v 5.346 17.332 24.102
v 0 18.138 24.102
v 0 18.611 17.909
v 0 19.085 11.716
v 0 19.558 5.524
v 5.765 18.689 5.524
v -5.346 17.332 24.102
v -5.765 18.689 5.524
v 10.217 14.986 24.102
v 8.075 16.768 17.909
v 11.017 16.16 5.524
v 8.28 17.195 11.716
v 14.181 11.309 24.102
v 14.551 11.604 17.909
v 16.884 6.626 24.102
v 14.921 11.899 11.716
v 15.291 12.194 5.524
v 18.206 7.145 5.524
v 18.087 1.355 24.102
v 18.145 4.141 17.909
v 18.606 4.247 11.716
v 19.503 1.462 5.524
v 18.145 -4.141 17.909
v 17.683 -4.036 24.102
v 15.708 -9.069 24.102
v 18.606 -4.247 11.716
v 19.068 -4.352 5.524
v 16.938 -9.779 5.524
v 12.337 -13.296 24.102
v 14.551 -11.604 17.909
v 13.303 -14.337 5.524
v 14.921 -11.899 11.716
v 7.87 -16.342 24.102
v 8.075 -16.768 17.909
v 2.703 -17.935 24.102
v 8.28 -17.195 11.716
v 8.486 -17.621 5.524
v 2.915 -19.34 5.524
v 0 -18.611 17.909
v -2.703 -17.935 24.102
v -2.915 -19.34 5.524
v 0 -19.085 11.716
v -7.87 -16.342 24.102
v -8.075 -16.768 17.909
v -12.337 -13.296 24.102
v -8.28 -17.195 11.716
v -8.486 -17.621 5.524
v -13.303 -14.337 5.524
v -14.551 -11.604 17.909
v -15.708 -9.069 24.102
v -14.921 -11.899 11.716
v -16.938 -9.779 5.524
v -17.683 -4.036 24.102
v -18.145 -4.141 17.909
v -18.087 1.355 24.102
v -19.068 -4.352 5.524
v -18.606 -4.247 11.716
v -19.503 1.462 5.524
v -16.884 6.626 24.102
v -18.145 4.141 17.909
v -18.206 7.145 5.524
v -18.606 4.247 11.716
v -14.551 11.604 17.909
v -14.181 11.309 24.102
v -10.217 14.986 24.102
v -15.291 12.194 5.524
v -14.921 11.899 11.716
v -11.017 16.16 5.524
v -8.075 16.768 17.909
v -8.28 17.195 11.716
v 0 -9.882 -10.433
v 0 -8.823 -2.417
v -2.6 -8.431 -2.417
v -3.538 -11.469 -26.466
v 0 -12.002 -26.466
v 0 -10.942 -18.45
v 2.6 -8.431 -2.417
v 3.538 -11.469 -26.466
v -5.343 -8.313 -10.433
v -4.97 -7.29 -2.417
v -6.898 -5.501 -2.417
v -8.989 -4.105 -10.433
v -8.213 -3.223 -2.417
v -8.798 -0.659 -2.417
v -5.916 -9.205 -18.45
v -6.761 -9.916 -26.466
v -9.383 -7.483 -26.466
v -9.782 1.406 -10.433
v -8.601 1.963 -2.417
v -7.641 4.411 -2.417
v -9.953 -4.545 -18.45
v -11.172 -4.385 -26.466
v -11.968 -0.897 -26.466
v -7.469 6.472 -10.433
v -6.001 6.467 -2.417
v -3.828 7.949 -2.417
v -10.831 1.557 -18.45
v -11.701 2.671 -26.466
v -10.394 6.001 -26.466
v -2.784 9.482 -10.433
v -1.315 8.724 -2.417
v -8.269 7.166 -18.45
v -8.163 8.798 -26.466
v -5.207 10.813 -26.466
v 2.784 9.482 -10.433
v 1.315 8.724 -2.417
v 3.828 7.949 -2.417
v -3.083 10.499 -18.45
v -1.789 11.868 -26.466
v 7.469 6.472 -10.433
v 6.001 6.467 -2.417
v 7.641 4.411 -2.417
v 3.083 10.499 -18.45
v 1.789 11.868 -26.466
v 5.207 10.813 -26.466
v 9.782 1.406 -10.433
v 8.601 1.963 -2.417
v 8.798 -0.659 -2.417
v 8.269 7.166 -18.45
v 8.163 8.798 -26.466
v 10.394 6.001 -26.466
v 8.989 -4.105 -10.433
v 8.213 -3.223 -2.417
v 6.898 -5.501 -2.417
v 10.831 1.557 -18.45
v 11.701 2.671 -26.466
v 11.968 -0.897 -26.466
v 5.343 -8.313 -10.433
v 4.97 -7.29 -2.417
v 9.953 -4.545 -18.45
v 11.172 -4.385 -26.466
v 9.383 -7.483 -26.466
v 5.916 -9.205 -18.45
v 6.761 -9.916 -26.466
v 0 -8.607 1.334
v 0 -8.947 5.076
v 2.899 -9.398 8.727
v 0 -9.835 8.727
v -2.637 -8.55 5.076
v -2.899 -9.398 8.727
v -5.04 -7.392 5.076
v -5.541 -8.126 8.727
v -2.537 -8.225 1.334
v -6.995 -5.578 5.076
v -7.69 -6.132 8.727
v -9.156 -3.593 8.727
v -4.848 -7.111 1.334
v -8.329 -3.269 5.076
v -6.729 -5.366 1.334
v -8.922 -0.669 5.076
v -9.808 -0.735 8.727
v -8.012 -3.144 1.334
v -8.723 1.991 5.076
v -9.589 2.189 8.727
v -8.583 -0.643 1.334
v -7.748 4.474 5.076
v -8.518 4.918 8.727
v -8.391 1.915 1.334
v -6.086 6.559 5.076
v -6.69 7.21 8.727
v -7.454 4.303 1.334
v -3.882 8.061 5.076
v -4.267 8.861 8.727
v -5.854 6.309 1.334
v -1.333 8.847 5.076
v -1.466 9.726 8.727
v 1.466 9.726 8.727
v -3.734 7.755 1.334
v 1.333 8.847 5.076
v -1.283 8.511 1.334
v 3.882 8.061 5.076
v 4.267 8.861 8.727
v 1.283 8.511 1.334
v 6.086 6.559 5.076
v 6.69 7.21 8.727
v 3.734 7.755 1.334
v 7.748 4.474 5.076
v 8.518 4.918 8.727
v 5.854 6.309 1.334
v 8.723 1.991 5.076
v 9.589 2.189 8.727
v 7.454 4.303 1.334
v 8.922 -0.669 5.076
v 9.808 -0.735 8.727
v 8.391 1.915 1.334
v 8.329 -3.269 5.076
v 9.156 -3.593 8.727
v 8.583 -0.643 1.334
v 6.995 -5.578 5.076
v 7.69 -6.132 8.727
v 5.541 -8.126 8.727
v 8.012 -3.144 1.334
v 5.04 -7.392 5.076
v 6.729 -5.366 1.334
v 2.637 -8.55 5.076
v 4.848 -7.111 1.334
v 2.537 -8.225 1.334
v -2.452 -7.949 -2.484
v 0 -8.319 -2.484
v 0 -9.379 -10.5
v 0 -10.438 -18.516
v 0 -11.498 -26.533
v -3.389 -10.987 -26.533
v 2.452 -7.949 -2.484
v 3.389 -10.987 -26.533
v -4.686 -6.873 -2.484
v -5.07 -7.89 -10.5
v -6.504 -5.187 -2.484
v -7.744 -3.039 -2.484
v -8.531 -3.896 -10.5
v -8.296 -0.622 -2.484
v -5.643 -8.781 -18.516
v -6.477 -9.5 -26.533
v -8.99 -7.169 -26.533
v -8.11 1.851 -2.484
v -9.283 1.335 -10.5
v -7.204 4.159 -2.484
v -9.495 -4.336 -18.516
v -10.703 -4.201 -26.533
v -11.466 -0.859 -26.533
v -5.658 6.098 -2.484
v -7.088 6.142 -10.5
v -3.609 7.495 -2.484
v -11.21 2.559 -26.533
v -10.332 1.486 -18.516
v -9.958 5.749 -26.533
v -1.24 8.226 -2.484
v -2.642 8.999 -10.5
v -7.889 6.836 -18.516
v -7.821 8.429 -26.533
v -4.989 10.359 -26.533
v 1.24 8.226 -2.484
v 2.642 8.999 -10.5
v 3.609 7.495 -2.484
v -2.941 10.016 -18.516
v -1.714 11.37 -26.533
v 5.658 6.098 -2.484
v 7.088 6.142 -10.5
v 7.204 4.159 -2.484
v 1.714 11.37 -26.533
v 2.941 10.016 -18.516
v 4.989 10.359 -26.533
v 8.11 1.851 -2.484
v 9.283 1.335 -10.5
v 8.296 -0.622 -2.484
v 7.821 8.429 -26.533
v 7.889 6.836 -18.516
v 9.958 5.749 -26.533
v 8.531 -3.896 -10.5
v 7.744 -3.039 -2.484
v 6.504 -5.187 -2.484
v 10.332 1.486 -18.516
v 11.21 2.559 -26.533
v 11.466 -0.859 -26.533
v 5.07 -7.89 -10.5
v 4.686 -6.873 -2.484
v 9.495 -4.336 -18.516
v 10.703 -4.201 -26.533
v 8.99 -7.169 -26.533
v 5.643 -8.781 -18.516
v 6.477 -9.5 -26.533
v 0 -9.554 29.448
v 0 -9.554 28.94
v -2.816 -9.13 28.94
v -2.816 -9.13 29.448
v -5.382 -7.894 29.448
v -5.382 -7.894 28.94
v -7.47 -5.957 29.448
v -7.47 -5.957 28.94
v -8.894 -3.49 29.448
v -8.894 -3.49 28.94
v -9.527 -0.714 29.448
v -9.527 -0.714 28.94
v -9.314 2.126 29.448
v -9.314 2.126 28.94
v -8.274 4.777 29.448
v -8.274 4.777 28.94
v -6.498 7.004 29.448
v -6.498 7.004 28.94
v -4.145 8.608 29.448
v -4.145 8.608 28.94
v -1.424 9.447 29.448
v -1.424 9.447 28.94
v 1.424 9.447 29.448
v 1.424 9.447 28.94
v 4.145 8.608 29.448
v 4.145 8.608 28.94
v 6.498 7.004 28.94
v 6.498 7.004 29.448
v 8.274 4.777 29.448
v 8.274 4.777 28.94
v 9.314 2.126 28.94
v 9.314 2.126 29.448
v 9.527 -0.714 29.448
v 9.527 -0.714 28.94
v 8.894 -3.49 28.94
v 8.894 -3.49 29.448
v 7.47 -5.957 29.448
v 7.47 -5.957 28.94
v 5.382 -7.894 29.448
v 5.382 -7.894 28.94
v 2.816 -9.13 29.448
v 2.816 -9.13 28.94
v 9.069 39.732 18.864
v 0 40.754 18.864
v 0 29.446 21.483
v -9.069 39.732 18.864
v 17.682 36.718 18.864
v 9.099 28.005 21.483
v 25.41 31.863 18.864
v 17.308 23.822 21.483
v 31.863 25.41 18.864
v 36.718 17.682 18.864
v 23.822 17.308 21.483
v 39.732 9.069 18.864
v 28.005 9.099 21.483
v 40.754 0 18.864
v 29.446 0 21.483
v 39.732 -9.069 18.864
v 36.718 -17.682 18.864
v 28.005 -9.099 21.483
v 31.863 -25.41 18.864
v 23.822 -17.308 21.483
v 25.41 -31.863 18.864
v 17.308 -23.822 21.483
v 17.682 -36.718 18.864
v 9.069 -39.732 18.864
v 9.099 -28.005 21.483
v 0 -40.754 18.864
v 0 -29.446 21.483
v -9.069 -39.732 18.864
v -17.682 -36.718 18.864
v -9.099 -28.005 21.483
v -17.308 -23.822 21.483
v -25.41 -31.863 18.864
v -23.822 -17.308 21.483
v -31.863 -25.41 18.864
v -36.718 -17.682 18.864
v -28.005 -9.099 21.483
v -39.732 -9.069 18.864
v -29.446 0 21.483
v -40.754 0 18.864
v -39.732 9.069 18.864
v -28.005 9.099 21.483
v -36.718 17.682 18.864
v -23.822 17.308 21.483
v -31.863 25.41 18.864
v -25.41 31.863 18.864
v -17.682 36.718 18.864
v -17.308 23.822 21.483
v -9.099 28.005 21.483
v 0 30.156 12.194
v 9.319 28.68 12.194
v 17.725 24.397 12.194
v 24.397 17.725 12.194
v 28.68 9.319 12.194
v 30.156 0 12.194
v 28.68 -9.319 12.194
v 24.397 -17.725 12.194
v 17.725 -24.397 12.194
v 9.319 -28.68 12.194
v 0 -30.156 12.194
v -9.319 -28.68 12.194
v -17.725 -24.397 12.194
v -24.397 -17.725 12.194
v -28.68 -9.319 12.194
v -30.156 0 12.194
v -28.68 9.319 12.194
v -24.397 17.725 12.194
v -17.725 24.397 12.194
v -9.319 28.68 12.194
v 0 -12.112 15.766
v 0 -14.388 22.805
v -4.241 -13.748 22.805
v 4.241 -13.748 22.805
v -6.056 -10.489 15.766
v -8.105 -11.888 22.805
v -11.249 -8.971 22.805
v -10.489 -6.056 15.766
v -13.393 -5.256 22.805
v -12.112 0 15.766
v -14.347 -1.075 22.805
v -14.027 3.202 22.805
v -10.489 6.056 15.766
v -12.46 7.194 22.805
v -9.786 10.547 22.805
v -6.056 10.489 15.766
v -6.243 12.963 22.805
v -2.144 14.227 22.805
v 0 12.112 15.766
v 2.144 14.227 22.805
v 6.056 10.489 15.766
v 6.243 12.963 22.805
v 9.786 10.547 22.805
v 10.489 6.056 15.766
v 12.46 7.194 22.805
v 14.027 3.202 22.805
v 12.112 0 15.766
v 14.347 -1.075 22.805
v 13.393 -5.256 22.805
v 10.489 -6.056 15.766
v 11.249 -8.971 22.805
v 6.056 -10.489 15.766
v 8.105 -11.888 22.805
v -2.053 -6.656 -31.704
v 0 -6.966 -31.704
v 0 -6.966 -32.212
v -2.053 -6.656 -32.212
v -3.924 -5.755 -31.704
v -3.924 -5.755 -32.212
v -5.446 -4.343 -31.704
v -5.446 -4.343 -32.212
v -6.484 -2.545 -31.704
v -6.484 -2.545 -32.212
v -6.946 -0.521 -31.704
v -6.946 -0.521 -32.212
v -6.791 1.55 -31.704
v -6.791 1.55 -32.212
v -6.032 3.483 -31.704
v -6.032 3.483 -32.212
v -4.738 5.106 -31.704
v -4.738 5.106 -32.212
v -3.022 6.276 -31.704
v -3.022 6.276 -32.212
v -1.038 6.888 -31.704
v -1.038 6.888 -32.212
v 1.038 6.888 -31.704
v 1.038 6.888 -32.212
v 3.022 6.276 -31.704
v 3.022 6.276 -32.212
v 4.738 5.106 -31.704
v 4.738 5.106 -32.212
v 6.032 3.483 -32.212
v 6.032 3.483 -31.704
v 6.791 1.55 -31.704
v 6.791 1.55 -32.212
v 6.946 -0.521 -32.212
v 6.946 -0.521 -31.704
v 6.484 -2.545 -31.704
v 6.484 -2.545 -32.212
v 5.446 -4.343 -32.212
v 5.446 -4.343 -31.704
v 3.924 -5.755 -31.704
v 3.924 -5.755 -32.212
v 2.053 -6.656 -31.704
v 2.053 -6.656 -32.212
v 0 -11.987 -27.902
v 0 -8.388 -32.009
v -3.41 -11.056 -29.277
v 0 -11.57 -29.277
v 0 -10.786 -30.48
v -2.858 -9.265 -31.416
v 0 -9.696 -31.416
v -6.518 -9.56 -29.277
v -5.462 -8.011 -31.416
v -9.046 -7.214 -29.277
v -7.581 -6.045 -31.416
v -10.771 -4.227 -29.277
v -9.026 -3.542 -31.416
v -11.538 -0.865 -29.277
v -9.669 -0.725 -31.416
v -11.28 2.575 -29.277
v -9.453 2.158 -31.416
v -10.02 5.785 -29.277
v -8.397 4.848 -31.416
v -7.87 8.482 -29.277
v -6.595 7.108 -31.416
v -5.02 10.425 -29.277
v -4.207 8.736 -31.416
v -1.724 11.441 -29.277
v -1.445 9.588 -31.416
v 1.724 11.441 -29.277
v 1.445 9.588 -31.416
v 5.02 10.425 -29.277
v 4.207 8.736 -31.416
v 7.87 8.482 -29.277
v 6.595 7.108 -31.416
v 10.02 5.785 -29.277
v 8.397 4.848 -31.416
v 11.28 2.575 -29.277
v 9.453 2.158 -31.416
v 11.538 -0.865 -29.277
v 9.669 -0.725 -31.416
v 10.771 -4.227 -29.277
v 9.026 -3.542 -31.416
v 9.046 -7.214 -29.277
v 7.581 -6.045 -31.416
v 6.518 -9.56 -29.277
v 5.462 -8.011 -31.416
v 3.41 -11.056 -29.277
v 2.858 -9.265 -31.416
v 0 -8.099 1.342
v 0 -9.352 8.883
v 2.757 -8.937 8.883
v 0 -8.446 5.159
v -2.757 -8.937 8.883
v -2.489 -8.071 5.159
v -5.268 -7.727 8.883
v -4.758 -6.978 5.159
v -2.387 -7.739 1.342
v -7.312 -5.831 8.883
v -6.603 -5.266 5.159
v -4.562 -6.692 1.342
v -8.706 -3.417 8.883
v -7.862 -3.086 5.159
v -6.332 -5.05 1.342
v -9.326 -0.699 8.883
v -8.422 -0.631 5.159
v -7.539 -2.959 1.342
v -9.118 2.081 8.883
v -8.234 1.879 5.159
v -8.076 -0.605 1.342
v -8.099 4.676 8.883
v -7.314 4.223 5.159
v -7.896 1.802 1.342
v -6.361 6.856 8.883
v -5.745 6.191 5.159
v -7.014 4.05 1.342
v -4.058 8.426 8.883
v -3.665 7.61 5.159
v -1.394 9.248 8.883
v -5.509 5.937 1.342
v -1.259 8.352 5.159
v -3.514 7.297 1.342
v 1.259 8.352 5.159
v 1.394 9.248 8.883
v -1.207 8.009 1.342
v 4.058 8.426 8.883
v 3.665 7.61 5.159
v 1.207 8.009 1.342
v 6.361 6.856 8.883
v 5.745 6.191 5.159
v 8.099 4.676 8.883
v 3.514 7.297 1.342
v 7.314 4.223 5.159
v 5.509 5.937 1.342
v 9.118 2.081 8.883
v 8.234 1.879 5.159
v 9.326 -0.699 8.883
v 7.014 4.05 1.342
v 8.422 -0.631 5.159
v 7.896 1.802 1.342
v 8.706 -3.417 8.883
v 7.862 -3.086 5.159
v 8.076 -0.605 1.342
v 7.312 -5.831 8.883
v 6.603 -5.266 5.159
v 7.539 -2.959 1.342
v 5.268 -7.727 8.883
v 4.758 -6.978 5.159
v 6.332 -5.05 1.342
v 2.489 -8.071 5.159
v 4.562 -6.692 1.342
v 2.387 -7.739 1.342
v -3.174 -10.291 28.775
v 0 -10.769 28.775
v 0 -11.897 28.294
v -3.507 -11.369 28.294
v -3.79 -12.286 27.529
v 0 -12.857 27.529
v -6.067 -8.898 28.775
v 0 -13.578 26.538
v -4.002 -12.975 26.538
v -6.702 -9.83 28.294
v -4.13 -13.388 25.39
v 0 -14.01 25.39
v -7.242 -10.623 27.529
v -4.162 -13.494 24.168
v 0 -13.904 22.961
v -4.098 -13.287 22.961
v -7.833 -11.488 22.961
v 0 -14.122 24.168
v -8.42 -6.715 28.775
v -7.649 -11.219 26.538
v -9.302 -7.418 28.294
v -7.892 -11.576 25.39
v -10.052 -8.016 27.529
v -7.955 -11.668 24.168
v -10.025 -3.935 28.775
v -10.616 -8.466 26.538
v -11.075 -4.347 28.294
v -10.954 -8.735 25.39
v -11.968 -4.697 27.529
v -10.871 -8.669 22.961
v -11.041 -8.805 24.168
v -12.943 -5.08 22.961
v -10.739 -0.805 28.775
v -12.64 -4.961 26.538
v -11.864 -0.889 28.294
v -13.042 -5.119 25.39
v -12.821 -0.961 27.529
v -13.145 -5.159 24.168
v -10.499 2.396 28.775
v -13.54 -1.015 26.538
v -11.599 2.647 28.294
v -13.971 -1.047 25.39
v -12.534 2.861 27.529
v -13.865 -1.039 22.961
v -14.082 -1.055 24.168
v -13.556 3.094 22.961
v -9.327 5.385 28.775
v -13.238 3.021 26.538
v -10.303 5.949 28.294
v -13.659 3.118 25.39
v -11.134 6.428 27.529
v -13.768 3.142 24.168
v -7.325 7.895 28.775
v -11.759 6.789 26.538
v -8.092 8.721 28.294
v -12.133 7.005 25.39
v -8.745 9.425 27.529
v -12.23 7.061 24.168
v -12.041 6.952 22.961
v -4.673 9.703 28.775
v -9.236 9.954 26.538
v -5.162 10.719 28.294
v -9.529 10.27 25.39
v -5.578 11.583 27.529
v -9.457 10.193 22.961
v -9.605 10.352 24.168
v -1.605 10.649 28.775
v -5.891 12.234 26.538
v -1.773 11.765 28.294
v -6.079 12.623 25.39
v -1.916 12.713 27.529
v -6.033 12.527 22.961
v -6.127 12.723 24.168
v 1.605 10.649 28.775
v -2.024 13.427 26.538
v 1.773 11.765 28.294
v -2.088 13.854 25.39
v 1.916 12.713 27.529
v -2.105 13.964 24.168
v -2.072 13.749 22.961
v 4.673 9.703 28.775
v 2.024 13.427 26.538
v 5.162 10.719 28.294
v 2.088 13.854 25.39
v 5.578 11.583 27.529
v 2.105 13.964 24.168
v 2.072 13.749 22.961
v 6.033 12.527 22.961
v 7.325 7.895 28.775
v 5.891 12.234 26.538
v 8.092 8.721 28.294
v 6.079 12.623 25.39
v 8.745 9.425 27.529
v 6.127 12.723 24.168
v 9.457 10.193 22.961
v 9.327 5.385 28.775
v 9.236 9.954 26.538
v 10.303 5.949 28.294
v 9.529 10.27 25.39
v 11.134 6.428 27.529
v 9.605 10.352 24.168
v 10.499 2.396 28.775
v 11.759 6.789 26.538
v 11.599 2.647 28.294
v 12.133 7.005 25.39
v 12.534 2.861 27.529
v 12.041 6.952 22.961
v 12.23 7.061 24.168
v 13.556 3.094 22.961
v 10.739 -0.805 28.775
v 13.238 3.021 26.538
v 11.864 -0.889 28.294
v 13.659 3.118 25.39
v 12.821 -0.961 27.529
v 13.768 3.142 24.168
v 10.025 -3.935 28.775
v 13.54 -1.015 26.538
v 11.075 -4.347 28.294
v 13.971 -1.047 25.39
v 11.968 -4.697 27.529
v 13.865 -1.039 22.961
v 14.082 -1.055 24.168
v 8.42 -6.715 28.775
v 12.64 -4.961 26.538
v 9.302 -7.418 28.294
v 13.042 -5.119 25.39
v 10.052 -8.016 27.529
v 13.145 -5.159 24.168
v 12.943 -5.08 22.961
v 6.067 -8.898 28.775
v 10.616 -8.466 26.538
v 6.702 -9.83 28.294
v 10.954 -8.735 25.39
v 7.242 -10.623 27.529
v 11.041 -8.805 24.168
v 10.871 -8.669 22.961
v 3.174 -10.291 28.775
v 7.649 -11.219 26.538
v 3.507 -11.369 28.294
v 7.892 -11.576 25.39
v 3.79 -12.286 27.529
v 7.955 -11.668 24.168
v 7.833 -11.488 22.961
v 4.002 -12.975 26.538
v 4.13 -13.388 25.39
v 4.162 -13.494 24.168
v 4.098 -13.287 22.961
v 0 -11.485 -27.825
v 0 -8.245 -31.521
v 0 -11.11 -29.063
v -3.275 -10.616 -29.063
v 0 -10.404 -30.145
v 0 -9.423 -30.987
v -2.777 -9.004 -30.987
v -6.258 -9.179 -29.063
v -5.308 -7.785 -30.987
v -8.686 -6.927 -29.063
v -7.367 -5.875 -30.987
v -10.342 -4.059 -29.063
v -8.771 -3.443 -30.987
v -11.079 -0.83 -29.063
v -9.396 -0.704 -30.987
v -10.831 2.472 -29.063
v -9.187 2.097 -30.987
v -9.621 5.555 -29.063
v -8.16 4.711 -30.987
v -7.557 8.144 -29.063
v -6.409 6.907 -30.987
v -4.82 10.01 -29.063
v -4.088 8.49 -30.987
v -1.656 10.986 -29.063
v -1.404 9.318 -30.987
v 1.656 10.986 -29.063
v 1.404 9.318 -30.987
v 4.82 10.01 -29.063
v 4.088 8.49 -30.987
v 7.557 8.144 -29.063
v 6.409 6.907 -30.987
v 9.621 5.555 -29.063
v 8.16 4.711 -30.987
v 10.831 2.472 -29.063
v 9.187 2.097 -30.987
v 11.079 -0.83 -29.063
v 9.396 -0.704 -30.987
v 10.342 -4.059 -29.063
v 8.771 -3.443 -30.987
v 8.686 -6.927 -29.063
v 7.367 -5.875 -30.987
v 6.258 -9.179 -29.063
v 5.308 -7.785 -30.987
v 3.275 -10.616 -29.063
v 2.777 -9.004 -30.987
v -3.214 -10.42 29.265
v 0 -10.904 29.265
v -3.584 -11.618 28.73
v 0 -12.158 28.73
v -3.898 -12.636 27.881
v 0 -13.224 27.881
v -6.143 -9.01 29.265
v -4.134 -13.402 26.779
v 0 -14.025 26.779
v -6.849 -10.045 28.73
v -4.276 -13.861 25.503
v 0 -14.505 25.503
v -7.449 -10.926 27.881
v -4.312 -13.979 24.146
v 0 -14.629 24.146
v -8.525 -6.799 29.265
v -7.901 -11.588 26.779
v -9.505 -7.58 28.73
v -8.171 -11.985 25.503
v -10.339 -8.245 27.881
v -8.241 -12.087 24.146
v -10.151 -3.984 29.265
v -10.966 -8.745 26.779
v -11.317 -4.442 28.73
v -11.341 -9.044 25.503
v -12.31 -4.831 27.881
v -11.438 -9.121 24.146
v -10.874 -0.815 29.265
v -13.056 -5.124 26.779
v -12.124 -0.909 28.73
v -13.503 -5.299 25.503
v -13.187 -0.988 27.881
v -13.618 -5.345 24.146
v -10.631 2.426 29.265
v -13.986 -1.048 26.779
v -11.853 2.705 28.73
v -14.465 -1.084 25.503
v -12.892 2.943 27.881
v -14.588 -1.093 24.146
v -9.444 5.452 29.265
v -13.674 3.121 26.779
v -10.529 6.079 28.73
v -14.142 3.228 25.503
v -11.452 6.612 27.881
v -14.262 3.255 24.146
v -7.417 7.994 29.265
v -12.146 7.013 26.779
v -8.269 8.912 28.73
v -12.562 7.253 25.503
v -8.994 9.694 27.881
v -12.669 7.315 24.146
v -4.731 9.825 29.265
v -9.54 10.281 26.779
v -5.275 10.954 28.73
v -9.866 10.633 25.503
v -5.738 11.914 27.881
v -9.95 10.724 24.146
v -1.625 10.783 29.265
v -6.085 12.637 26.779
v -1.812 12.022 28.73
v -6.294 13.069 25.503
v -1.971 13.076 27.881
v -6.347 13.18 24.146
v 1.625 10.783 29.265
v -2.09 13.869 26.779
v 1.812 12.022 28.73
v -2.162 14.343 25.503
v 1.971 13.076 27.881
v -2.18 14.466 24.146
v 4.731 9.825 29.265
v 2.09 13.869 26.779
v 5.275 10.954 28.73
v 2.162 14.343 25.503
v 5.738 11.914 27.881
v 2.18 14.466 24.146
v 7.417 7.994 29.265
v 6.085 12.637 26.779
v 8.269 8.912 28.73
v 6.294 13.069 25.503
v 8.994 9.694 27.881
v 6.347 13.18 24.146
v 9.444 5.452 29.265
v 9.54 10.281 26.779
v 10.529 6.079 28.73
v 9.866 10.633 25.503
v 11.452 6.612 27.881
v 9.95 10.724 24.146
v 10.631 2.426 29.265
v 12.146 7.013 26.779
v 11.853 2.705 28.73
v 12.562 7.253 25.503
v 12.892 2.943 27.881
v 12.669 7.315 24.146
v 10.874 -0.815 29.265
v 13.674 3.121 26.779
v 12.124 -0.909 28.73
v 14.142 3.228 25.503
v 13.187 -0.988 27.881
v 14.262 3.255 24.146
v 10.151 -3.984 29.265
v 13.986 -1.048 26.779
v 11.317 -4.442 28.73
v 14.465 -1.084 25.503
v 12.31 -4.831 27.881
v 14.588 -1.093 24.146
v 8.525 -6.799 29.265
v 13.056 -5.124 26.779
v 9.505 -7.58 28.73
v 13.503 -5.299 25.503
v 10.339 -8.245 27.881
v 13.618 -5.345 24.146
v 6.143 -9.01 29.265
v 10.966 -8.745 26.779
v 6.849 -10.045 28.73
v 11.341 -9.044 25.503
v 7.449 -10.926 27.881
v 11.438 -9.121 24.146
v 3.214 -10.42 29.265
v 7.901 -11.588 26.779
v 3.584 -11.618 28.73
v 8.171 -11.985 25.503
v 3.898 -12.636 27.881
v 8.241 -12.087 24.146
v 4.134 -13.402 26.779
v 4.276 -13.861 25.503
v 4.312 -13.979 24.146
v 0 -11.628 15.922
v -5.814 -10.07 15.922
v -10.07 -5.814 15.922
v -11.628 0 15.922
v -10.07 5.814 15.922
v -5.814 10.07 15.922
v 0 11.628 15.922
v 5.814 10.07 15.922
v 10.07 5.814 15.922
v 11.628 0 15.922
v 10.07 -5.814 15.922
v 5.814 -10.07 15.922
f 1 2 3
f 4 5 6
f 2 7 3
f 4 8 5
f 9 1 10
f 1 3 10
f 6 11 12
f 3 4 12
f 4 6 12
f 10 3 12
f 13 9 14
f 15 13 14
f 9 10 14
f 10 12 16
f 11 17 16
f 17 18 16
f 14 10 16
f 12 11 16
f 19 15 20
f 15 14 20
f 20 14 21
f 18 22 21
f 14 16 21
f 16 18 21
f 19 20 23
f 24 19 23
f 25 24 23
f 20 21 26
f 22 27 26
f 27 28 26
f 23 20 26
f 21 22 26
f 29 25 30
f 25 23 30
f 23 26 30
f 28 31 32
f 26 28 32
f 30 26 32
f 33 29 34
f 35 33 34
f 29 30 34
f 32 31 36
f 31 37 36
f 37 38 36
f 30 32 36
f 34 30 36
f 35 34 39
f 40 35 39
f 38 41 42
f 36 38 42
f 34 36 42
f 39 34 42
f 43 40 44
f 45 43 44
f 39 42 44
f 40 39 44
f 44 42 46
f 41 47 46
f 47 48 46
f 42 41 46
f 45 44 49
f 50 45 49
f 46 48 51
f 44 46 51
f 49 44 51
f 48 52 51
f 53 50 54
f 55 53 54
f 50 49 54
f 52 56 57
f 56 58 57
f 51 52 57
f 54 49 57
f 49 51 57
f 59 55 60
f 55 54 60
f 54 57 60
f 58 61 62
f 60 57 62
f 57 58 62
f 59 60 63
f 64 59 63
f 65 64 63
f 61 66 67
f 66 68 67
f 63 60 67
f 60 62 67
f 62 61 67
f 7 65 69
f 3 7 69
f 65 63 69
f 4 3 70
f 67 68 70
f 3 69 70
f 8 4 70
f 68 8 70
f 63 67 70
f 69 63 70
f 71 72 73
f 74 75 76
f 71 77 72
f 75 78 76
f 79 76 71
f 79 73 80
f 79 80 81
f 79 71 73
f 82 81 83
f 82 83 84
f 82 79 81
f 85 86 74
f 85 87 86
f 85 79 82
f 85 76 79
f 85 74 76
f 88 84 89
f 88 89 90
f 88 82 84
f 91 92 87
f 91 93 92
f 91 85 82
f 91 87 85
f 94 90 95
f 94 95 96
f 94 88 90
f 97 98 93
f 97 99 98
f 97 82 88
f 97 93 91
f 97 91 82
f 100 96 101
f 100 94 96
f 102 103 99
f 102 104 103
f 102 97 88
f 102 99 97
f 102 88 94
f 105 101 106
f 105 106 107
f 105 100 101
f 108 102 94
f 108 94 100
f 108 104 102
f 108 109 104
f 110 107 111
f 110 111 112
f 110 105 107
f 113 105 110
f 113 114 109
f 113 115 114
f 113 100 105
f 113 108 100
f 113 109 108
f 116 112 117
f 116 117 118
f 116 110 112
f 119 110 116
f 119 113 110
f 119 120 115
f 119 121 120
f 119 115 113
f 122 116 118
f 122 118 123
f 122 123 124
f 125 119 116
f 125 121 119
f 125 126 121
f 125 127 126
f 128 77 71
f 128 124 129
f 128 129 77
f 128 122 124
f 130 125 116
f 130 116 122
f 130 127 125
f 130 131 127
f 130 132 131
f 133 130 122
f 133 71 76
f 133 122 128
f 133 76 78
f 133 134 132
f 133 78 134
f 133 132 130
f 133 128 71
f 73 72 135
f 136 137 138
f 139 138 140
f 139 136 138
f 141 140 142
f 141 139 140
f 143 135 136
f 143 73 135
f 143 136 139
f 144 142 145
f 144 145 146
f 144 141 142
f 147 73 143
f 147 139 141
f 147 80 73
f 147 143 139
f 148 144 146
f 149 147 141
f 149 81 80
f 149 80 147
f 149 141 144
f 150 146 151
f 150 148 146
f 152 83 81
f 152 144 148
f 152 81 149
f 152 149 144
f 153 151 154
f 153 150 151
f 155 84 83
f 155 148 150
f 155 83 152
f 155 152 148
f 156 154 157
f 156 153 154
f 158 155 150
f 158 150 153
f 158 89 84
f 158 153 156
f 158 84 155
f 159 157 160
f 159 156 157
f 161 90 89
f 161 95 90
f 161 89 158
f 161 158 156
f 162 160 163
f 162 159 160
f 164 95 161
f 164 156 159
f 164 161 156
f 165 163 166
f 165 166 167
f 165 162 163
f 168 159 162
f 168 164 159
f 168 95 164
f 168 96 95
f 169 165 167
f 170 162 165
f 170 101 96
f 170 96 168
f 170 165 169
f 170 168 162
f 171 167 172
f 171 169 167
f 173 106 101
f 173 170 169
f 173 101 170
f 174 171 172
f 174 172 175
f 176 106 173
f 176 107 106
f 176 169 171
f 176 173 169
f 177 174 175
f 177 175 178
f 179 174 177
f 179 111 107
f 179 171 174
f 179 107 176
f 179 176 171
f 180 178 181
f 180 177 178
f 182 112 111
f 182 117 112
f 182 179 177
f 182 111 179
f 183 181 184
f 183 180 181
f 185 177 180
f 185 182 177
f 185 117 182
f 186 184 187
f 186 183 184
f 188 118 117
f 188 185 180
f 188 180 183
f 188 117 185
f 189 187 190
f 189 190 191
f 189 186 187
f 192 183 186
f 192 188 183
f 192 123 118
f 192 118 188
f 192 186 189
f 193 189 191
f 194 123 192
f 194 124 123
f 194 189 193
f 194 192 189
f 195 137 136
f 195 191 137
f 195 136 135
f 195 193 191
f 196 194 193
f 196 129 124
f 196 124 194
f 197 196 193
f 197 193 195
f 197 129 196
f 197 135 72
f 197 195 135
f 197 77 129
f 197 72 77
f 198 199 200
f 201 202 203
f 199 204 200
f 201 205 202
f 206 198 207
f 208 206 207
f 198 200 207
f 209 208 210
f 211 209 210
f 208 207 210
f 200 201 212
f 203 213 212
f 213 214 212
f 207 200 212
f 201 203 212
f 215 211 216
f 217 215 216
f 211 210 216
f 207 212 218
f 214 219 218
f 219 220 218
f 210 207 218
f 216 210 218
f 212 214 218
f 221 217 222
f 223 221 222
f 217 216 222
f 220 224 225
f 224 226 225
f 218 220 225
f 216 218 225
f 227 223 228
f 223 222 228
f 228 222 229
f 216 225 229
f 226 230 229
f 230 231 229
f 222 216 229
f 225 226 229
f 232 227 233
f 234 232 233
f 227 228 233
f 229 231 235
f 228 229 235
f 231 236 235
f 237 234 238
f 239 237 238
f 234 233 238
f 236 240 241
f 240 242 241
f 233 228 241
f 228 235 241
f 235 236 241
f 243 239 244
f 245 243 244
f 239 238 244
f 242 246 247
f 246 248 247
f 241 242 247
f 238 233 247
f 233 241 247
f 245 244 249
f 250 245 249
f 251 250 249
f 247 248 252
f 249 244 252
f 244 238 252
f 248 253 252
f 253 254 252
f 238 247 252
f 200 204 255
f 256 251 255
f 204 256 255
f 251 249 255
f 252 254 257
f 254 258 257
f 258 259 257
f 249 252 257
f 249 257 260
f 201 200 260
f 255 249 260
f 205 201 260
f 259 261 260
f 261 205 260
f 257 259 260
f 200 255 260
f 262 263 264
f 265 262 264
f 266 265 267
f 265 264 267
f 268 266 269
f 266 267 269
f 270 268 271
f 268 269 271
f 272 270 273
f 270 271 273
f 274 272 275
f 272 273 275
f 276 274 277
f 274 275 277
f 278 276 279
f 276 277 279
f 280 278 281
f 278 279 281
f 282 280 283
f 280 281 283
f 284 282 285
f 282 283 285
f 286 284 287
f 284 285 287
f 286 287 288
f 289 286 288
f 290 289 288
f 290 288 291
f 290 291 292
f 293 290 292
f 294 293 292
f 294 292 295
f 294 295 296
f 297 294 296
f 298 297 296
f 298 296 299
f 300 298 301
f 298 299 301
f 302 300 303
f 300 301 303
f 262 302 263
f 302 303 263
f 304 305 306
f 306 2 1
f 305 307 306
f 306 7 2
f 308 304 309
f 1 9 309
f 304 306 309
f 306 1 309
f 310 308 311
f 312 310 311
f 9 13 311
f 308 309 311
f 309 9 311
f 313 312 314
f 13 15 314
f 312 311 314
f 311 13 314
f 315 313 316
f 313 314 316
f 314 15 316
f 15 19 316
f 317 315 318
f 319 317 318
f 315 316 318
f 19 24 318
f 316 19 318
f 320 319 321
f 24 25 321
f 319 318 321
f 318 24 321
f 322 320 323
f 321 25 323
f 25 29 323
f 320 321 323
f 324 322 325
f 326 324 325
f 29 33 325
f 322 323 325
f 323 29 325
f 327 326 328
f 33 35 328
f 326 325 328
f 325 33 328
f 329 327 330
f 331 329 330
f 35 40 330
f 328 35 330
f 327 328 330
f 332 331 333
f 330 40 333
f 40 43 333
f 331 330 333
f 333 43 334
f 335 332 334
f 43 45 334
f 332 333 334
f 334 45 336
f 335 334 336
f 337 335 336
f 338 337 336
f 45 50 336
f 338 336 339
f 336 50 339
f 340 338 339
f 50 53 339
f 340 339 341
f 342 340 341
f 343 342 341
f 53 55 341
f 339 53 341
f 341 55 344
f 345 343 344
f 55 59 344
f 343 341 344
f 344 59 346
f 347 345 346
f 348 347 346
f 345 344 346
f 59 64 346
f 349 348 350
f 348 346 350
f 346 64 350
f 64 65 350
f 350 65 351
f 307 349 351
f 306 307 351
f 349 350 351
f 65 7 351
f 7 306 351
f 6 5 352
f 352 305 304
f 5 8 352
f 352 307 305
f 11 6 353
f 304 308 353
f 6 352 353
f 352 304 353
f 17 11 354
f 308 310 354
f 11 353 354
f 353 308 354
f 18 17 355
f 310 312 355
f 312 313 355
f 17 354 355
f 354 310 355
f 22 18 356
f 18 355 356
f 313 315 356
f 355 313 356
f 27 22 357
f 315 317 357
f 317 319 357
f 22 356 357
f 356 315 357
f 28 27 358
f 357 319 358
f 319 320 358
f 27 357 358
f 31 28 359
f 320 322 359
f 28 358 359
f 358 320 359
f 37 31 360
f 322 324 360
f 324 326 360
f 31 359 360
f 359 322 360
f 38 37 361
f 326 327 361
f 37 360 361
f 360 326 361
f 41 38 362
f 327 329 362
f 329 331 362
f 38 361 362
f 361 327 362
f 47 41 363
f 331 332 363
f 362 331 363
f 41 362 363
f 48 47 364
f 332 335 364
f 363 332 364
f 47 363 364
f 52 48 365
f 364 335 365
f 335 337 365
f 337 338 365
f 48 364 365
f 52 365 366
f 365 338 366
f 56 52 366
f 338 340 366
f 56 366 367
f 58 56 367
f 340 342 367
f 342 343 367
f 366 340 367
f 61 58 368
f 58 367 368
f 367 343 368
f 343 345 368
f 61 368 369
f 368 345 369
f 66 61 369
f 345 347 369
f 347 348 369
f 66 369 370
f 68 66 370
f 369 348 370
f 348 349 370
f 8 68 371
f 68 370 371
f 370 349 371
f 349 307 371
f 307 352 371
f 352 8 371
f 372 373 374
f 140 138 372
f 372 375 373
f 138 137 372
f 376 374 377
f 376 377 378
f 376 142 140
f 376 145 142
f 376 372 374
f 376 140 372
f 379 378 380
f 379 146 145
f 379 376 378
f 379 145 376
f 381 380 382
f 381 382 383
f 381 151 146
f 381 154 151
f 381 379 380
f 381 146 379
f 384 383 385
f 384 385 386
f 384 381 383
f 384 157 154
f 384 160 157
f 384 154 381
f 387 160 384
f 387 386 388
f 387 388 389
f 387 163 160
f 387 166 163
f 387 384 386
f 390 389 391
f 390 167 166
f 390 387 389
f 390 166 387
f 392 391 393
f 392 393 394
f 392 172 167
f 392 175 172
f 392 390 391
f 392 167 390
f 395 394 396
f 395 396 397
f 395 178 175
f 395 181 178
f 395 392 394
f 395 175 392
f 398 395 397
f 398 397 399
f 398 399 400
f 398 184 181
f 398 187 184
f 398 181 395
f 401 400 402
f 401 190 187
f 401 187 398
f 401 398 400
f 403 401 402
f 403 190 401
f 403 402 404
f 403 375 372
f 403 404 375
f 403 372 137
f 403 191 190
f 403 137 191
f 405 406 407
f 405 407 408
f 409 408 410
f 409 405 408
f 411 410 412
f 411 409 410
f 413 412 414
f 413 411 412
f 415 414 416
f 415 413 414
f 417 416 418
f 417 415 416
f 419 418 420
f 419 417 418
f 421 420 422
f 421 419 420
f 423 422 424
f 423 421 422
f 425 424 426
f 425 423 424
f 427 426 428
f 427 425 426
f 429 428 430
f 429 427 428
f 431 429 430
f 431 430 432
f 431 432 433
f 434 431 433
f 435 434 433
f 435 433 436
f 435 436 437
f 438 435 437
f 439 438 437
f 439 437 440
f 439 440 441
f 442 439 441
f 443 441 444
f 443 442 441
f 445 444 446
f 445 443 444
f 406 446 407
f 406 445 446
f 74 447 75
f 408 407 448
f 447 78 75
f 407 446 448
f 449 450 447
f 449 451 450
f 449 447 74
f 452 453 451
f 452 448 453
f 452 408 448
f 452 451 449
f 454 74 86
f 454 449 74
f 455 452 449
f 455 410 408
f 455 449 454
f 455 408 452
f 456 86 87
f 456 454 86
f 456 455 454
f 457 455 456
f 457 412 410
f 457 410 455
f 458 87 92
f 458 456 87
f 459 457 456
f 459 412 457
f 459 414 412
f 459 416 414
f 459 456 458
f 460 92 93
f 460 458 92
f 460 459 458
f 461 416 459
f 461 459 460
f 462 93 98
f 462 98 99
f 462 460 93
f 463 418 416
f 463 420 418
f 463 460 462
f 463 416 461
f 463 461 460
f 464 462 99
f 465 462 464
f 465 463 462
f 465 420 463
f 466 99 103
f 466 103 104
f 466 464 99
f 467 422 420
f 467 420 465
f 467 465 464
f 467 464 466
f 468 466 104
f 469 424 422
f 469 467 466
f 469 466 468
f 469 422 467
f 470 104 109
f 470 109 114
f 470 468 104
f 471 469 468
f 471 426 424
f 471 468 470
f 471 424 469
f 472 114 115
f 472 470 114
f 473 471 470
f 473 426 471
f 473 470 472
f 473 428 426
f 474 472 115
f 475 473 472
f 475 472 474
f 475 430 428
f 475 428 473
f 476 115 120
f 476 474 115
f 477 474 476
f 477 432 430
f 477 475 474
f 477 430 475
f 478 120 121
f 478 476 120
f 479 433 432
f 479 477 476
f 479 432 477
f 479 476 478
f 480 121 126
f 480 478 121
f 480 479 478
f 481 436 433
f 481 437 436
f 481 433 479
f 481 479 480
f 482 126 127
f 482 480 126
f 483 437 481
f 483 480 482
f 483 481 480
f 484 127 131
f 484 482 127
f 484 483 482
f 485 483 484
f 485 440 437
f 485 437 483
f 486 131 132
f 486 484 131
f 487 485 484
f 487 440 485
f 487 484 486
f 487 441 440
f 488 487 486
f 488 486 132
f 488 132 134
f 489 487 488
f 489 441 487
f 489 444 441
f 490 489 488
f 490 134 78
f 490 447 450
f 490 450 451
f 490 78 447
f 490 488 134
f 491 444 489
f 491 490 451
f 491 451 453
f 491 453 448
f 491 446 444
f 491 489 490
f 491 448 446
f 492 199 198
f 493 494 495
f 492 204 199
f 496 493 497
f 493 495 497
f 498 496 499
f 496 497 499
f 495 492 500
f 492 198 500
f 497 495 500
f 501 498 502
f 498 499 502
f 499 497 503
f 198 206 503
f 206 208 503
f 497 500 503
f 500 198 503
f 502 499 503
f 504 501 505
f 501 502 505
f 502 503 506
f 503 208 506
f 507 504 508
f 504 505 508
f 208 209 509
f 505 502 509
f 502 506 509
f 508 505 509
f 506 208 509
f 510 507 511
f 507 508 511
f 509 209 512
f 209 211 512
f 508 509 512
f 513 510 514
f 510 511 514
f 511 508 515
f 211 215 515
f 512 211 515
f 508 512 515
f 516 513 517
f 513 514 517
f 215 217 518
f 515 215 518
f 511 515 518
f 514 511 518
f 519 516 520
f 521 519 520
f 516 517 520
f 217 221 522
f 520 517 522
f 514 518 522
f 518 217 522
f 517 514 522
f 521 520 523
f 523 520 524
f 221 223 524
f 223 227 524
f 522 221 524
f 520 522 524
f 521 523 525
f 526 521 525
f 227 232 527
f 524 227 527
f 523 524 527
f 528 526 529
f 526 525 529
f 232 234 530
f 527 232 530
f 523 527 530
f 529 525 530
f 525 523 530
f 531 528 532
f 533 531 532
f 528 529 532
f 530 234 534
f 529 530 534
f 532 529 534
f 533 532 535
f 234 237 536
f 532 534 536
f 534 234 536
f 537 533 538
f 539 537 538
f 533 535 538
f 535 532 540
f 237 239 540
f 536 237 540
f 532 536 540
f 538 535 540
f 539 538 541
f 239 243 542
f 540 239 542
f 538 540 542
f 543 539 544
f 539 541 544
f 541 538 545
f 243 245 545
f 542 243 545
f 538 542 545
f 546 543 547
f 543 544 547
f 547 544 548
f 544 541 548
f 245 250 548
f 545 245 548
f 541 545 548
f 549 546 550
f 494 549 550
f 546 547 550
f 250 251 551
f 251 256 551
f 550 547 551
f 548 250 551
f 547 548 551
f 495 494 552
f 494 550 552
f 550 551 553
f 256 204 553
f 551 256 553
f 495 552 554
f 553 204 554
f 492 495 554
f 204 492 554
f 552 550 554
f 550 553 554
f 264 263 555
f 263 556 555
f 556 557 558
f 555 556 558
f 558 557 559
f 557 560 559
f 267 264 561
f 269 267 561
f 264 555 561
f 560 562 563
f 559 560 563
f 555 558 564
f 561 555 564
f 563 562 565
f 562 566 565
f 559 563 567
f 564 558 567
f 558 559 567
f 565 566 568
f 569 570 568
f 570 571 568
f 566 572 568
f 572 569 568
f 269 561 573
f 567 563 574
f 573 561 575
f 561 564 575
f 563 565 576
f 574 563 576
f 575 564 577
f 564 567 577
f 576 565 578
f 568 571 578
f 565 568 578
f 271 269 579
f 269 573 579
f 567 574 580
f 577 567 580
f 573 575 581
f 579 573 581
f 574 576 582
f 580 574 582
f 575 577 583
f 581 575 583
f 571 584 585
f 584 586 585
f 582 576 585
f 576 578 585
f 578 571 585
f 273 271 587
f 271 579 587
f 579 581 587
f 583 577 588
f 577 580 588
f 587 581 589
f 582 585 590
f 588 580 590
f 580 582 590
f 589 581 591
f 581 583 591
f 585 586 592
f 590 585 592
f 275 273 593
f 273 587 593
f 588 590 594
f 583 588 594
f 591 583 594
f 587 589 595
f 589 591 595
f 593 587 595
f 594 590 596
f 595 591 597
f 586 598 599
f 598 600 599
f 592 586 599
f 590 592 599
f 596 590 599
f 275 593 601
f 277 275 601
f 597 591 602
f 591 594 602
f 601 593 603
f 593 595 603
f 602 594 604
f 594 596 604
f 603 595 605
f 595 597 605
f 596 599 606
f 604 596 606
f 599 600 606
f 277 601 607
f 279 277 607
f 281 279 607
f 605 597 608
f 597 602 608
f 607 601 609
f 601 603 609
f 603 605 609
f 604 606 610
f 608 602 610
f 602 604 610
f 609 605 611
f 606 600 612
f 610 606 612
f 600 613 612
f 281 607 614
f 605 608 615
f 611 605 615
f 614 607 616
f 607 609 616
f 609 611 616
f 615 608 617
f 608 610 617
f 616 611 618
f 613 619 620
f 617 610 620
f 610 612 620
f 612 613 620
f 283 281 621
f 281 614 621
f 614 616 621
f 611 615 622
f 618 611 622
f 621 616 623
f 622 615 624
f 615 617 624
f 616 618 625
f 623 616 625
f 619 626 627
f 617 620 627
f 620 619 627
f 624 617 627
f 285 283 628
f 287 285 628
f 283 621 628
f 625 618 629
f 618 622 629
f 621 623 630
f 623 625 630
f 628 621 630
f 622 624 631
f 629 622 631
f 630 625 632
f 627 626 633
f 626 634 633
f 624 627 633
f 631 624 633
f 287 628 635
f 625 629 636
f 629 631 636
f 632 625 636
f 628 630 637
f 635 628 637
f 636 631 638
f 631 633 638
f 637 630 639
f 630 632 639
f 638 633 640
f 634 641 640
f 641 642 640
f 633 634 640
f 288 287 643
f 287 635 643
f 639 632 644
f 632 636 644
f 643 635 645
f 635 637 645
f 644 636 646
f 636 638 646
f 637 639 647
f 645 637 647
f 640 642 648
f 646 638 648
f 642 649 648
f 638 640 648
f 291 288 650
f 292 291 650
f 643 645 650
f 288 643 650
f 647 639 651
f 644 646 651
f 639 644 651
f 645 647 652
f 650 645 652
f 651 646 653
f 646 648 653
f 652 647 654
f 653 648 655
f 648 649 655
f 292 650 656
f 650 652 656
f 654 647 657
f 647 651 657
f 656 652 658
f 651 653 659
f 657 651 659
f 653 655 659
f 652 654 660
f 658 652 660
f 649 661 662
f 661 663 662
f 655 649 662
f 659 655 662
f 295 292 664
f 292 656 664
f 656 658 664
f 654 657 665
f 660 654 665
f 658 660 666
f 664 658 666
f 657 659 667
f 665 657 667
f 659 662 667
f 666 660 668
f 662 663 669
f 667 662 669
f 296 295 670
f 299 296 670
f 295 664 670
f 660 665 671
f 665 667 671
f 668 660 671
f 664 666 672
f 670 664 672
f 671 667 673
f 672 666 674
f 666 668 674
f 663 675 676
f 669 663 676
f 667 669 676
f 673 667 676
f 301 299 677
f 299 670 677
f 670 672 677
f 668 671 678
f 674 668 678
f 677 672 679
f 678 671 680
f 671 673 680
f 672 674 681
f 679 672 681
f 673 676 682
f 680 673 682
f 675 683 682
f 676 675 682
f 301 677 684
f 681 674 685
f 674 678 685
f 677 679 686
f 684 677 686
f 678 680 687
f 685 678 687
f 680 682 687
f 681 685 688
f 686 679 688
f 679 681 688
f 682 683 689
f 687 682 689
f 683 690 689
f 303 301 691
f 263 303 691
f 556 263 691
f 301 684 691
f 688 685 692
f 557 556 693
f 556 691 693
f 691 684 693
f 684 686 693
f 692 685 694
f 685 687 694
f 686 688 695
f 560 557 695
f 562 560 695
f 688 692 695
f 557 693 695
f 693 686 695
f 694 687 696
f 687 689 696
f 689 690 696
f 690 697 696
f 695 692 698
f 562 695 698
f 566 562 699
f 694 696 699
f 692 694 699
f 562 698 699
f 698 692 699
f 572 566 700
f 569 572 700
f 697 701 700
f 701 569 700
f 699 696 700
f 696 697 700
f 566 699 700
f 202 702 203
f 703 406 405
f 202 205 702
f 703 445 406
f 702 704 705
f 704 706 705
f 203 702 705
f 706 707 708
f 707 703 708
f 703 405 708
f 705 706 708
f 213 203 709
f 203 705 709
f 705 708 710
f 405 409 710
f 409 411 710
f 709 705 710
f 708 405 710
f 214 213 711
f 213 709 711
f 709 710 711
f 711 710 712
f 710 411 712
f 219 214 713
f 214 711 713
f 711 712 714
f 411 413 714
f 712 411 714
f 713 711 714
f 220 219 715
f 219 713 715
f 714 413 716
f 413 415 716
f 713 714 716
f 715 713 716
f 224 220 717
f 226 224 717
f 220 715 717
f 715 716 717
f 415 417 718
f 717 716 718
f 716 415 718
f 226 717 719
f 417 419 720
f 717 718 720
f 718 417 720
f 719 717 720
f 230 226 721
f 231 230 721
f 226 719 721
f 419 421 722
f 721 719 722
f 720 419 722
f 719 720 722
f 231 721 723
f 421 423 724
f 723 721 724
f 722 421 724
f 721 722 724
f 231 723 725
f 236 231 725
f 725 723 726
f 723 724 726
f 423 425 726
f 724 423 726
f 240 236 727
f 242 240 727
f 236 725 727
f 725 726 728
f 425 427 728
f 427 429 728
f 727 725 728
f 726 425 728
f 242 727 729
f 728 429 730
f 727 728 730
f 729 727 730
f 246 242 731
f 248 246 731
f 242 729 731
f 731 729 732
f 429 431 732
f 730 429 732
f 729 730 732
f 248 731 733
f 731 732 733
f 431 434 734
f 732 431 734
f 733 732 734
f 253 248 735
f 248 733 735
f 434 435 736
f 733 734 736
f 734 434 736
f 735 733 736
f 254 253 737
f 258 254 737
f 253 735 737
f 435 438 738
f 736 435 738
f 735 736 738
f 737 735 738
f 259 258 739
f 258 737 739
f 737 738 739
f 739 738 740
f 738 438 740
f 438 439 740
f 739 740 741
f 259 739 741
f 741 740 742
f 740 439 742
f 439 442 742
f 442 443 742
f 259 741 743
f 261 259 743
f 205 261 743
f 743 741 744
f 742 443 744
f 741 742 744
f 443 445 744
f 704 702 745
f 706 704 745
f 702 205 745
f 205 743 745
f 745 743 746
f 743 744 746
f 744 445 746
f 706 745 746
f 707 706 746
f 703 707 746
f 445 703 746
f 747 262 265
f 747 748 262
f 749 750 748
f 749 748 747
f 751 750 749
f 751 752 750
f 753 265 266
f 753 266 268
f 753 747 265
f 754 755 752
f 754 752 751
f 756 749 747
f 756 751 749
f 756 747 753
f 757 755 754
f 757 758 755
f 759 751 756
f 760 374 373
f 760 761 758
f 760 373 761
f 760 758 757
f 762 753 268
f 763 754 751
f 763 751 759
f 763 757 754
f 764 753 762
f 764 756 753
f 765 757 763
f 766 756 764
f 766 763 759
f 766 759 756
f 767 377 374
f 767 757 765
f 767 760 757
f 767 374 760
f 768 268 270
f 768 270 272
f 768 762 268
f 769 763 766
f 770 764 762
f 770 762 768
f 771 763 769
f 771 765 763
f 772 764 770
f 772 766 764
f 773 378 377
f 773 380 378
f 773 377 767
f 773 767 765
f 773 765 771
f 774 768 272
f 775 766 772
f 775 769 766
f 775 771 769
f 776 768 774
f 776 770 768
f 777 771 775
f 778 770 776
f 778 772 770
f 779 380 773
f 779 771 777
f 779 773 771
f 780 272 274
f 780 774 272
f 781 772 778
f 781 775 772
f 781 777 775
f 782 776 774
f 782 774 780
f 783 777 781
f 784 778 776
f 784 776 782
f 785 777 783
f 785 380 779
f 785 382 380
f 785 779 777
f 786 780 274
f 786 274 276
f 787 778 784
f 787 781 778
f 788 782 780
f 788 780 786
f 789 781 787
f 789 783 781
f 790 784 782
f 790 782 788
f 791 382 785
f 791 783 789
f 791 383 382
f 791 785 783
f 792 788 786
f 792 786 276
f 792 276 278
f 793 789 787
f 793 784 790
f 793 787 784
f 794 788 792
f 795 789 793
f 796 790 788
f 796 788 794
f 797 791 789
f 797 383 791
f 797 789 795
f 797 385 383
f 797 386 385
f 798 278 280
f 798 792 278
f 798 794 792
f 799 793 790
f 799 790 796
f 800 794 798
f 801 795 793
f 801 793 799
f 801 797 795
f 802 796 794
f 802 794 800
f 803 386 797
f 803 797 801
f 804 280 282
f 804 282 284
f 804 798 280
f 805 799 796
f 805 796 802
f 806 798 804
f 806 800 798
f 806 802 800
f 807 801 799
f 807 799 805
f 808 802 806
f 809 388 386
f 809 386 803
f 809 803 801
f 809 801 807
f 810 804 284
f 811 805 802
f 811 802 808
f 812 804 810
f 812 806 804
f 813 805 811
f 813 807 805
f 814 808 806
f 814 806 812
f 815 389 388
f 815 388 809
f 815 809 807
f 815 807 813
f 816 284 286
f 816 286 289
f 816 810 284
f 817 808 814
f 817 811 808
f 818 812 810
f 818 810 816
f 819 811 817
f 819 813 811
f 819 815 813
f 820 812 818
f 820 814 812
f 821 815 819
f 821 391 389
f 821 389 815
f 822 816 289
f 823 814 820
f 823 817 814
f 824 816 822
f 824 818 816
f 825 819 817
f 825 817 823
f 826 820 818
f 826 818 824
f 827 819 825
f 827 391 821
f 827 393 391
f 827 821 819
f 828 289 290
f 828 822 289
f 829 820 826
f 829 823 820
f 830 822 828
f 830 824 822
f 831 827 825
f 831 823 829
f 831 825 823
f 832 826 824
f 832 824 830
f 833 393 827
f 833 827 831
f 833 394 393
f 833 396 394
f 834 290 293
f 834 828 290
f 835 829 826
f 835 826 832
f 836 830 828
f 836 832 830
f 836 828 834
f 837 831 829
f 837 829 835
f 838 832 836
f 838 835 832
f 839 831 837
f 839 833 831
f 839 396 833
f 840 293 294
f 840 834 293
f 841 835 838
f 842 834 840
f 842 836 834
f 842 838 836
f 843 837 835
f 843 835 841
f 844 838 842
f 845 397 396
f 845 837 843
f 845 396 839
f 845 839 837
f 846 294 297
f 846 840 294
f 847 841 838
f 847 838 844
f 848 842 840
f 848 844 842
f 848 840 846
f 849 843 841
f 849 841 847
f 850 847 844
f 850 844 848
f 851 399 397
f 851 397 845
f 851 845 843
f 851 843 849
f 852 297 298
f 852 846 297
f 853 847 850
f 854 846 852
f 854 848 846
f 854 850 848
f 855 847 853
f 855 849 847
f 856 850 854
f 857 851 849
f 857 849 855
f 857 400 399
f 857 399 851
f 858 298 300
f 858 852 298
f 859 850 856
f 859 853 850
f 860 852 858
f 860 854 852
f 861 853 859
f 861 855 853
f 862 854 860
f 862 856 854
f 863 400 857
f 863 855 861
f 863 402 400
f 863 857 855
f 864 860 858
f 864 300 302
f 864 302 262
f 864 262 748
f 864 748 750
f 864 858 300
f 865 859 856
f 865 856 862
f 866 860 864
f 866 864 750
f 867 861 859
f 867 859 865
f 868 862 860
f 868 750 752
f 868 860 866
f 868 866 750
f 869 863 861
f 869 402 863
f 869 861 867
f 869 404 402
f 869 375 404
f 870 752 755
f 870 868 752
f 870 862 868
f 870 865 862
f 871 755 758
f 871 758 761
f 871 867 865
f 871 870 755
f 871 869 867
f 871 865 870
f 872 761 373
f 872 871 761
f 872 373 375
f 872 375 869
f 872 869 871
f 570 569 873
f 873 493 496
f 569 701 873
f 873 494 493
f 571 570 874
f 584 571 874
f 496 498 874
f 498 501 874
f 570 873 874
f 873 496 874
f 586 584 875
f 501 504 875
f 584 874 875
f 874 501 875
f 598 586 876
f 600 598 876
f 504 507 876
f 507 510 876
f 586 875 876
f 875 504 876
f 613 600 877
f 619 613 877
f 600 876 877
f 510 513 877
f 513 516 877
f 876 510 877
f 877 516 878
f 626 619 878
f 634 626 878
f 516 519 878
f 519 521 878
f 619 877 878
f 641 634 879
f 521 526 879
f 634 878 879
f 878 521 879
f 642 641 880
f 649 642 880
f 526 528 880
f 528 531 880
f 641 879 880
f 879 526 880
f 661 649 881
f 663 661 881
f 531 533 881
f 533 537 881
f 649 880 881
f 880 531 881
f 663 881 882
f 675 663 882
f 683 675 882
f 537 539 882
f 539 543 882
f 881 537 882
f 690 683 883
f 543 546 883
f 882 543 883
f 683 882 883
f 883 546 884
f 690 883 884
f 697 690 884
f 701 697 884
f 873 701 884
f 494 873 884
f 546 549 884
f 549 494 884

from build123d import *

# Parameters (mm, degrees)
F2_R = 5.08
F3_R = 5.08
F4_T = -0.508


# Not quite as in the source:
# - a shell that OpenCascade refuses in one call is made with other operations: the cavity is built on its own and cut out


with BuildPart() as f1:
    # F0 (on Right) → F1 (revolve)
    with BuildSketch(Plane.YZ):
        with BuildLine():
            Line((0, -32.2118587792), (0, 29.4477399439))
            Line((0, 29.4477399439), (-2.8095957153, 29.4477399439))
            Line((-2.8095957153, 29.4477399439), (-16.535570845, 29.4477399439))
            Line((-16.535570845, 29.4477399439), (-9.8354473889, 8.7265070489))
            ThreePointArc((-9.8354473889, 8.7265070489), (-8.7077256174, 3.2112280279), (-8.8225213679, -2.4169938057))
            Line((-8.8225213679, -2.4169938057), (-12.7613620927, -32.2118587792))
            Line((-12.7613620927, -32.2118587792), (0, -32.2118587792))
        make_face()
    revolve(axis=Axis((0, 0, -1.3820594177), (0, 0, -1)))

    # F2
    f2_edges = [f1.edges().sort_by_distance(p)[0] for p in [
        (0, 16.535571, 29.44774),
    ]]
    fillet(f2_edges, radius=F2_R)

    # F3
    f3_edges = [f1.edges().sort_by_distance(p)[0] for p in [
        (0, 12.761362, -32.211859),
    ]]
    fillet(f3_edges, radius=F3_R)

    # F4: a shell. OpenCascade refuses it in one call, so the cavity is built on its own and cut out:
    # the body offset inwards by the wall thickness, plus a prism from it out through each open face.
    f4_core = offset(f1.part, amount=F4_T, mode=Mode.PRIVATE)
    f4_exits = [f4_core.faces().sort_by_distance(p)[0] for p in [
        (0, 0, 28.93974),
        (0, 0, -31.703859),
    ]]
    add(f4_core, mode=Mode.SUBTRACT)
    extrude(f4_exits, amount=-F4_T, mode=Mode.SUBTRACT)


with BuildPart() as f1b:
    # F0 (on Right) → F1, piece 2 (revolve)
    with BuildSketch(Plane.YZ):
        Polygon((40.7538414001, 18.8644435257), (18.1377814998, 24.1019894291), (19.5579826832, 5.523710046), align=None)
    revolve(axis=Axis((0, 0, -1.3820594177), (0, 0, -1)))


solid = Compound([f1.part, f1b.part])
